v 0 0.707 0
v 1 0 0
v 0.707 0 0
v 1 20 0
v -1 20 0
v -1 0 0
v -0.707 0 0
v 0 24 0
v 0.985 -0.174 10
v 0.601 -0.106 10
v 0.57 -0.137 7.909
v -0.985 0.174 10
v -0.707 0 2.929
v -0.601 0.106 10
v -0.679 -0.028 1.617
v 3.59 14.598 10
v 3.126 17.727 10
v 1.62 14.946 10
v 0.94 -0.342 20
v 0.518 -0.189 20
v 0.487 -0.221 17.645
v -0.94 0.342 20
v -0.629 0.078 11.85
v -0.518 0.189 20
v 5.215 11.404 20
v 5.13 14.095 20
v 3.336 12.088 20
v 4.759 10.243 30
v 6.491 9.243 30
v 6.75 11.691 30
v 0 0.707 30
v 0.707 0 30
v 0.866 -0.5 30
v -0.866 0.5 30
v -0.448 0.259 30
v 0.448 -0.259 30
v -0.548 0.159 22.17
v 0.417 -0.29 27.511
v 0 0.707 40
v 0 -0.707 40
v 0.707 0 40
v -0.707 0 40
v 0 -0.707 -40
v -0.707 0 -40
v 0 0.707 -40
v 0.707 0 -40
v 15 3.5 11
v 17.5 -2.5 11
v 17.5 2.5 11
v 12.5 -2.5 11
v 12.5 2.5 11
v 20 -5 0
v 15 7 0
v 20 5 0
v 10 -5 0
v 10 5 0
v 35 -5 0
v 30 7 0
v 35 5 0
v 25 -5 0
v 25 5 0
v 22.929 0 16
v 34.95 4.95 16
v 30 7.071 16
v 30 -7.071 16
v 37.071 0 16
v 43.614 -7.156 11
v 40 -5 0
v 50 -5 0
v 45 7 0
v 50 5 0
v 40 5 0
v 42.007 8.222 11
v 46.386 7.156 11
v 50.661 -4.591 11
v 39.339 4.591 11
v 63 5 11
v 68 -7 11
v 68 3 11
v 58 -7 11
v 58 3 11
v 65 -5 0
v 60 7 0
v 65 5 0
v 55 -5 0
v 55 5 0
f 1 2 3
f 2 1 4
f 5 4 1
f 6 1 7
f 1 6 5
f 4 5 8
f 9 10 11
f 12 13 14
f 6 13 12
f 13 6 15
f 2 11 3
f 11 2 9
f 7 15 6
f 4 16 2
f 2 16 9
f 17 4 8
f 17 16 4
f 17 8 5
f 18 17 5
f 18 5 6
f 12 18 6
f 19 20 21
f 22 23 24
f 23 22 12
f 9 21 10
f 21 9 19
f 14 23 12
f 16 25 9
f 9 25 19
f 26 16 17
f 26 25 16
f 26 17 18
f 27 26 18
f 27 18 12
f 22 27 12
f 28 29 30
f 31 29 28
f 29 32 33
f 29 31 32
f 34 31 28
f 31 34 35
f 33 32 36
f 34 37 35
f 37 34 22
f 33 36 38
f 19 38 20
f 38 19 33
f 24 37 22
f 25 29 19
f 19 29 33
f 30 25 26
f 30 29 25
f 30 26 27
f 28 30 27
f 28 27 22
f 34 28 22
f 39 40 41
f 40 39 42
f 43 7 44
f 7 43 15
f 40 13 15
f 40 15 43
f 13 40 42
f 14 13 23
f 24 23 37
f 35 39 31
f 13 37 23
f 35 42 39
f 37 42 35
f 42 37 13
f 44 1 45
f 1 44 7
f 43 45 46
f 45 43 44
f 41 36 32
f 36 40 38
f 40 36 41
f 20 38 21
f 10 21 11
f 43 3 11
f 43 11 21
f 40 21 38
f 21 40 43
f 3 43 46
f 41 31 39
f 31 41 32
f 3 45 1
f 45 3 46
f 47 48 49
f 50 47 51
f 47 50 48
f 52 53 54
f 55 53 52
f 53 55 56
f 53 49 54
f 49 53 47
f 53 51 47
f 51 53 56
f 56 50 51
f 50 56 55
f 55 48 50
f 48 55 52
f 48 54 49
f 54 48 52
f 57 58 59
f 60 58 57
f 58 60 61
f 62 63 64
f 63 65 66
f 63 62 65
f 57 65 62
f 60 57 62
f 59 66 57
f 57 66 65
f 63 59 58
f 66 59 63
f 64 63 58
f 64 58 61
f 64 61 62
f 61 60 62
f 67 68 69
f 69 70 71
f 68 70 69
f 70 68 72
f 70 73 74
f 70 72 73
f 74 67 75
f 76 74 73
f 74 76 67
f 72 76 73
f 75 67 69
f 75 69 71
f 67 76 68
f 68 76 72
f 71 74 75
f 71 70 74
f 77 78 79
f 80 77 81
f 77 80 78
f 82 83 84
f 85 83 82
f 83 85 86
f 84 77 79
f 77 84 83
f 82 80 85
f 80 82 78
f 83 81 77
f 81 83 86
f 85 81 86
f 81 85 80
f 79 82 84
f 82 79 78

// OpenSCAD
//# Copyright (C) 2017 Robert Marchese
//
// An alternative to the standard linear extrusion operation.
//
// A list of 2D coordinates is transformed by the given parametes 
// and moved to the z=h plane. The original and transformed set of 
// points are used to generate a polyhedron.
//
// This program is available under the Creative Commons 
// Attribution-ShareAlike License; additional terms may apply. 
// 
// References:
// https://en.wikipedia.org/wiki/Transformation_matrix#Affine_transformations
// https://en.wikibooks.org/wiki/OpenSCAD_User_Manual/Primitive_Solids#polyhedron
//

// Examples
// Test points form a little house shape centered on [0,0]
points = [[-5,-5],[5,-5],[5,5],[0,7],[-5,5]];


//translate([-15,0,0]) polygon(points);

// height 10, no other transforms
//alt_extrude(points, 10);
stretch (
    points,
    transform_matrix(0, 0, [.2,2],[0,5]),
    transform_matrix(10, -10, [.2,1.5], [0,5]));
stretch (
    points,
    transform_matrix(10, -10, [.2,1.5], [0,5]),
    transform_matrix(20, -20, [.2,1.25], [0,5]));
stretch (
    points,
    transform_matrix(20, -20, [.2,1.25], [0,5]),
    transform_matrix(30, -30, [.2,1.125], [0,5]));
rotate([0,0,45]) translate([0,-0,0]) cube([1,1,80], center=true);

// height 10, top surface scaled to half size
translate([15,0,0]) alt_extrude(points, 10, 0, [.5,.5]);

// height 15, rotated 45 deg counter clockwise
translate([30,0,0]) alt_extrude(points, 15, -45, [1, 1]);

// height 10, rotated 20 deg and scaled 75% in X, 125% in Y
translate([45,0,0]) alt_extrude(points, 10, 20, [.75,1.25]);

// height 10, skewed left x=3 and down 2
translate([60,0,0]) alt_extrude(points, 10, 0, [1,1], [3,-2]);
// Examples
//

// Dot product of two vectors of length 3.
function dot(a, b) = a[0]*b[0]+a[1]*b[1]+a[2]*b[2];

// Generates a transfrom matrix from the given paramers
// h - the Z-axis value the polygon is moved to
// a - rotation angle
// s - scale factors, a vector [Sx, Sy]
// t - translation value, a vector [Tx, amd Ty]
// Returns a 3x3 matrix for the Rotation, Scale and 
// Translation (in that order)
/*
function transform_matrix(h=0, a=0, s=[1,1], t=[0,0]) = 
    [[s[0]*cos(a), -s[1]*sin(a), t[0]],
     [s[0]*sin(a),  s[1]*cos(a), t[1]],
     [          0,            0, h]];
*/
function transform_matrix(h=0, a=0, s=[1,1], t=[0,0]) =
    [[s[0]*cos(a), -s[1]*sin(a), t[0]*s[0]*cos(a)-t[1]*s[1]*sin(a)],
     [s[0]*sin(a),  s[1]*cos(a), t[0]*s[0]*sin(a)+t[1]*s[1]*cos(a)],
     [          0,            0, h]];

// Stiches together two sets of 2D polygon points seperated to for a 
// polyhedron. The two sets of points are generated by extending the
// original set into 3D (by adding a 3D coordinate, Z=1) and then
// transforming them with the two matricies, m0 and m1. 
module stretch(p2d, m0, m1) {
    n = len(p2d);

    p = [ for(i=[0:n-1]) [p2d[i][0], p2d[i][1], 1] ];

    p0 = [for(i=[0:n-1]) [dot(p[i],m0[0]), dot(p[i],m0[1]), dot(p[i],m0[2])] ];
    p1 = [for(i=[0:n-1]) [dot(p[i],m1[0]), dot(p[i],m1[1]), dot(p[i],m1[2])] ];

    bottom = [[for(i=[0:n-1]) i]];
    top    = [[for(i=[2*n-1:-1:n]) i%(2*n)]];
    sides  = [ for (i=[0:n-1]) [(0+i)%n+n,(1+i)%n+n,(1+i)%n,(0+i)%n]];
    all_faces = concat(bottom, top, sides);

    polyhedron(concat(p0, p1), all_faces);
}


// Form a polygon from the points p. The bottom surfaces is
// and n-gon defined by p while the top surface is generated
// from these by applying transforms given in the parameters
// 
//  p - The set of points forming the base of the polyhedron
//  h - The height of the polyhedron
//  ang-Rotation of the top surface around [0,0]
//  s - A vector length 2 defining the scale factors for x and Y
//  t - A vector defining the translation distance. Note, this
//      transform is applied after all of the others.
//
module alt_extrude(p, h=1, ang=0, s=[1,1], t=[0,0]) {
    stretch (
        p,
        transform_matrix(),
        transform_matrix(h+1, ang, s, t));
/*
    n = len(p);

    // Generate the transform matrix for top surface. Could be
    // 2x2, but the last column defines a skew tanslation. 
    M =[[s[0]*cos(ang), -s[1]*sin(ang), t[0]],
        [s[0]*sin(ang),  s[1]*cos(ang), t[1]],
        [            0,              0, 1]];

    // Extend coords for bottom to 3D, using z=1 (see Affine
    // Transforms reference above)
    p0 = [ for(i=[0:n-1]) [p[i][0], p[i][1], 1] ];

    // Apply transform matrix to x and y values of p0. Z value is
    // overwritten since it would be ignored for this 2D transform
    // and it is convenient to do it here.
    p1 = [for(i=[0:n-1]) [dot(p0[i],M[0]), dot(p0[i],M[1]), h+1] ];

    // Each faces is defined by a list of vertcies taken from
    // p0 and p1. The top and bottoms are all the p0 and p1
    // taken in clockwise order when looking at the final polyhedron
    // from outside. The others are two points from p0 and the 
    // corresponding 2 from p1.
    bottom = [[for(i=[0:n-1]) i]];
    top   = [[for(i=[2*n-1:-1:n]) i%(2*n)]];
    sides = [ for (i=[0:n-1]) [(0+i)%n+n,(1+i)%n+n,(1+i)%n,(0+i)%n]];
    all_faces = concat(bottom, top, sides);

    // Generate the polyhedron and translate down 1 unit to compensate
    // for offset used to expand 2D points into 3D
    translate([0,0,-1]) polyhedron(concat(p0, p1), all_faces);
*/
}
